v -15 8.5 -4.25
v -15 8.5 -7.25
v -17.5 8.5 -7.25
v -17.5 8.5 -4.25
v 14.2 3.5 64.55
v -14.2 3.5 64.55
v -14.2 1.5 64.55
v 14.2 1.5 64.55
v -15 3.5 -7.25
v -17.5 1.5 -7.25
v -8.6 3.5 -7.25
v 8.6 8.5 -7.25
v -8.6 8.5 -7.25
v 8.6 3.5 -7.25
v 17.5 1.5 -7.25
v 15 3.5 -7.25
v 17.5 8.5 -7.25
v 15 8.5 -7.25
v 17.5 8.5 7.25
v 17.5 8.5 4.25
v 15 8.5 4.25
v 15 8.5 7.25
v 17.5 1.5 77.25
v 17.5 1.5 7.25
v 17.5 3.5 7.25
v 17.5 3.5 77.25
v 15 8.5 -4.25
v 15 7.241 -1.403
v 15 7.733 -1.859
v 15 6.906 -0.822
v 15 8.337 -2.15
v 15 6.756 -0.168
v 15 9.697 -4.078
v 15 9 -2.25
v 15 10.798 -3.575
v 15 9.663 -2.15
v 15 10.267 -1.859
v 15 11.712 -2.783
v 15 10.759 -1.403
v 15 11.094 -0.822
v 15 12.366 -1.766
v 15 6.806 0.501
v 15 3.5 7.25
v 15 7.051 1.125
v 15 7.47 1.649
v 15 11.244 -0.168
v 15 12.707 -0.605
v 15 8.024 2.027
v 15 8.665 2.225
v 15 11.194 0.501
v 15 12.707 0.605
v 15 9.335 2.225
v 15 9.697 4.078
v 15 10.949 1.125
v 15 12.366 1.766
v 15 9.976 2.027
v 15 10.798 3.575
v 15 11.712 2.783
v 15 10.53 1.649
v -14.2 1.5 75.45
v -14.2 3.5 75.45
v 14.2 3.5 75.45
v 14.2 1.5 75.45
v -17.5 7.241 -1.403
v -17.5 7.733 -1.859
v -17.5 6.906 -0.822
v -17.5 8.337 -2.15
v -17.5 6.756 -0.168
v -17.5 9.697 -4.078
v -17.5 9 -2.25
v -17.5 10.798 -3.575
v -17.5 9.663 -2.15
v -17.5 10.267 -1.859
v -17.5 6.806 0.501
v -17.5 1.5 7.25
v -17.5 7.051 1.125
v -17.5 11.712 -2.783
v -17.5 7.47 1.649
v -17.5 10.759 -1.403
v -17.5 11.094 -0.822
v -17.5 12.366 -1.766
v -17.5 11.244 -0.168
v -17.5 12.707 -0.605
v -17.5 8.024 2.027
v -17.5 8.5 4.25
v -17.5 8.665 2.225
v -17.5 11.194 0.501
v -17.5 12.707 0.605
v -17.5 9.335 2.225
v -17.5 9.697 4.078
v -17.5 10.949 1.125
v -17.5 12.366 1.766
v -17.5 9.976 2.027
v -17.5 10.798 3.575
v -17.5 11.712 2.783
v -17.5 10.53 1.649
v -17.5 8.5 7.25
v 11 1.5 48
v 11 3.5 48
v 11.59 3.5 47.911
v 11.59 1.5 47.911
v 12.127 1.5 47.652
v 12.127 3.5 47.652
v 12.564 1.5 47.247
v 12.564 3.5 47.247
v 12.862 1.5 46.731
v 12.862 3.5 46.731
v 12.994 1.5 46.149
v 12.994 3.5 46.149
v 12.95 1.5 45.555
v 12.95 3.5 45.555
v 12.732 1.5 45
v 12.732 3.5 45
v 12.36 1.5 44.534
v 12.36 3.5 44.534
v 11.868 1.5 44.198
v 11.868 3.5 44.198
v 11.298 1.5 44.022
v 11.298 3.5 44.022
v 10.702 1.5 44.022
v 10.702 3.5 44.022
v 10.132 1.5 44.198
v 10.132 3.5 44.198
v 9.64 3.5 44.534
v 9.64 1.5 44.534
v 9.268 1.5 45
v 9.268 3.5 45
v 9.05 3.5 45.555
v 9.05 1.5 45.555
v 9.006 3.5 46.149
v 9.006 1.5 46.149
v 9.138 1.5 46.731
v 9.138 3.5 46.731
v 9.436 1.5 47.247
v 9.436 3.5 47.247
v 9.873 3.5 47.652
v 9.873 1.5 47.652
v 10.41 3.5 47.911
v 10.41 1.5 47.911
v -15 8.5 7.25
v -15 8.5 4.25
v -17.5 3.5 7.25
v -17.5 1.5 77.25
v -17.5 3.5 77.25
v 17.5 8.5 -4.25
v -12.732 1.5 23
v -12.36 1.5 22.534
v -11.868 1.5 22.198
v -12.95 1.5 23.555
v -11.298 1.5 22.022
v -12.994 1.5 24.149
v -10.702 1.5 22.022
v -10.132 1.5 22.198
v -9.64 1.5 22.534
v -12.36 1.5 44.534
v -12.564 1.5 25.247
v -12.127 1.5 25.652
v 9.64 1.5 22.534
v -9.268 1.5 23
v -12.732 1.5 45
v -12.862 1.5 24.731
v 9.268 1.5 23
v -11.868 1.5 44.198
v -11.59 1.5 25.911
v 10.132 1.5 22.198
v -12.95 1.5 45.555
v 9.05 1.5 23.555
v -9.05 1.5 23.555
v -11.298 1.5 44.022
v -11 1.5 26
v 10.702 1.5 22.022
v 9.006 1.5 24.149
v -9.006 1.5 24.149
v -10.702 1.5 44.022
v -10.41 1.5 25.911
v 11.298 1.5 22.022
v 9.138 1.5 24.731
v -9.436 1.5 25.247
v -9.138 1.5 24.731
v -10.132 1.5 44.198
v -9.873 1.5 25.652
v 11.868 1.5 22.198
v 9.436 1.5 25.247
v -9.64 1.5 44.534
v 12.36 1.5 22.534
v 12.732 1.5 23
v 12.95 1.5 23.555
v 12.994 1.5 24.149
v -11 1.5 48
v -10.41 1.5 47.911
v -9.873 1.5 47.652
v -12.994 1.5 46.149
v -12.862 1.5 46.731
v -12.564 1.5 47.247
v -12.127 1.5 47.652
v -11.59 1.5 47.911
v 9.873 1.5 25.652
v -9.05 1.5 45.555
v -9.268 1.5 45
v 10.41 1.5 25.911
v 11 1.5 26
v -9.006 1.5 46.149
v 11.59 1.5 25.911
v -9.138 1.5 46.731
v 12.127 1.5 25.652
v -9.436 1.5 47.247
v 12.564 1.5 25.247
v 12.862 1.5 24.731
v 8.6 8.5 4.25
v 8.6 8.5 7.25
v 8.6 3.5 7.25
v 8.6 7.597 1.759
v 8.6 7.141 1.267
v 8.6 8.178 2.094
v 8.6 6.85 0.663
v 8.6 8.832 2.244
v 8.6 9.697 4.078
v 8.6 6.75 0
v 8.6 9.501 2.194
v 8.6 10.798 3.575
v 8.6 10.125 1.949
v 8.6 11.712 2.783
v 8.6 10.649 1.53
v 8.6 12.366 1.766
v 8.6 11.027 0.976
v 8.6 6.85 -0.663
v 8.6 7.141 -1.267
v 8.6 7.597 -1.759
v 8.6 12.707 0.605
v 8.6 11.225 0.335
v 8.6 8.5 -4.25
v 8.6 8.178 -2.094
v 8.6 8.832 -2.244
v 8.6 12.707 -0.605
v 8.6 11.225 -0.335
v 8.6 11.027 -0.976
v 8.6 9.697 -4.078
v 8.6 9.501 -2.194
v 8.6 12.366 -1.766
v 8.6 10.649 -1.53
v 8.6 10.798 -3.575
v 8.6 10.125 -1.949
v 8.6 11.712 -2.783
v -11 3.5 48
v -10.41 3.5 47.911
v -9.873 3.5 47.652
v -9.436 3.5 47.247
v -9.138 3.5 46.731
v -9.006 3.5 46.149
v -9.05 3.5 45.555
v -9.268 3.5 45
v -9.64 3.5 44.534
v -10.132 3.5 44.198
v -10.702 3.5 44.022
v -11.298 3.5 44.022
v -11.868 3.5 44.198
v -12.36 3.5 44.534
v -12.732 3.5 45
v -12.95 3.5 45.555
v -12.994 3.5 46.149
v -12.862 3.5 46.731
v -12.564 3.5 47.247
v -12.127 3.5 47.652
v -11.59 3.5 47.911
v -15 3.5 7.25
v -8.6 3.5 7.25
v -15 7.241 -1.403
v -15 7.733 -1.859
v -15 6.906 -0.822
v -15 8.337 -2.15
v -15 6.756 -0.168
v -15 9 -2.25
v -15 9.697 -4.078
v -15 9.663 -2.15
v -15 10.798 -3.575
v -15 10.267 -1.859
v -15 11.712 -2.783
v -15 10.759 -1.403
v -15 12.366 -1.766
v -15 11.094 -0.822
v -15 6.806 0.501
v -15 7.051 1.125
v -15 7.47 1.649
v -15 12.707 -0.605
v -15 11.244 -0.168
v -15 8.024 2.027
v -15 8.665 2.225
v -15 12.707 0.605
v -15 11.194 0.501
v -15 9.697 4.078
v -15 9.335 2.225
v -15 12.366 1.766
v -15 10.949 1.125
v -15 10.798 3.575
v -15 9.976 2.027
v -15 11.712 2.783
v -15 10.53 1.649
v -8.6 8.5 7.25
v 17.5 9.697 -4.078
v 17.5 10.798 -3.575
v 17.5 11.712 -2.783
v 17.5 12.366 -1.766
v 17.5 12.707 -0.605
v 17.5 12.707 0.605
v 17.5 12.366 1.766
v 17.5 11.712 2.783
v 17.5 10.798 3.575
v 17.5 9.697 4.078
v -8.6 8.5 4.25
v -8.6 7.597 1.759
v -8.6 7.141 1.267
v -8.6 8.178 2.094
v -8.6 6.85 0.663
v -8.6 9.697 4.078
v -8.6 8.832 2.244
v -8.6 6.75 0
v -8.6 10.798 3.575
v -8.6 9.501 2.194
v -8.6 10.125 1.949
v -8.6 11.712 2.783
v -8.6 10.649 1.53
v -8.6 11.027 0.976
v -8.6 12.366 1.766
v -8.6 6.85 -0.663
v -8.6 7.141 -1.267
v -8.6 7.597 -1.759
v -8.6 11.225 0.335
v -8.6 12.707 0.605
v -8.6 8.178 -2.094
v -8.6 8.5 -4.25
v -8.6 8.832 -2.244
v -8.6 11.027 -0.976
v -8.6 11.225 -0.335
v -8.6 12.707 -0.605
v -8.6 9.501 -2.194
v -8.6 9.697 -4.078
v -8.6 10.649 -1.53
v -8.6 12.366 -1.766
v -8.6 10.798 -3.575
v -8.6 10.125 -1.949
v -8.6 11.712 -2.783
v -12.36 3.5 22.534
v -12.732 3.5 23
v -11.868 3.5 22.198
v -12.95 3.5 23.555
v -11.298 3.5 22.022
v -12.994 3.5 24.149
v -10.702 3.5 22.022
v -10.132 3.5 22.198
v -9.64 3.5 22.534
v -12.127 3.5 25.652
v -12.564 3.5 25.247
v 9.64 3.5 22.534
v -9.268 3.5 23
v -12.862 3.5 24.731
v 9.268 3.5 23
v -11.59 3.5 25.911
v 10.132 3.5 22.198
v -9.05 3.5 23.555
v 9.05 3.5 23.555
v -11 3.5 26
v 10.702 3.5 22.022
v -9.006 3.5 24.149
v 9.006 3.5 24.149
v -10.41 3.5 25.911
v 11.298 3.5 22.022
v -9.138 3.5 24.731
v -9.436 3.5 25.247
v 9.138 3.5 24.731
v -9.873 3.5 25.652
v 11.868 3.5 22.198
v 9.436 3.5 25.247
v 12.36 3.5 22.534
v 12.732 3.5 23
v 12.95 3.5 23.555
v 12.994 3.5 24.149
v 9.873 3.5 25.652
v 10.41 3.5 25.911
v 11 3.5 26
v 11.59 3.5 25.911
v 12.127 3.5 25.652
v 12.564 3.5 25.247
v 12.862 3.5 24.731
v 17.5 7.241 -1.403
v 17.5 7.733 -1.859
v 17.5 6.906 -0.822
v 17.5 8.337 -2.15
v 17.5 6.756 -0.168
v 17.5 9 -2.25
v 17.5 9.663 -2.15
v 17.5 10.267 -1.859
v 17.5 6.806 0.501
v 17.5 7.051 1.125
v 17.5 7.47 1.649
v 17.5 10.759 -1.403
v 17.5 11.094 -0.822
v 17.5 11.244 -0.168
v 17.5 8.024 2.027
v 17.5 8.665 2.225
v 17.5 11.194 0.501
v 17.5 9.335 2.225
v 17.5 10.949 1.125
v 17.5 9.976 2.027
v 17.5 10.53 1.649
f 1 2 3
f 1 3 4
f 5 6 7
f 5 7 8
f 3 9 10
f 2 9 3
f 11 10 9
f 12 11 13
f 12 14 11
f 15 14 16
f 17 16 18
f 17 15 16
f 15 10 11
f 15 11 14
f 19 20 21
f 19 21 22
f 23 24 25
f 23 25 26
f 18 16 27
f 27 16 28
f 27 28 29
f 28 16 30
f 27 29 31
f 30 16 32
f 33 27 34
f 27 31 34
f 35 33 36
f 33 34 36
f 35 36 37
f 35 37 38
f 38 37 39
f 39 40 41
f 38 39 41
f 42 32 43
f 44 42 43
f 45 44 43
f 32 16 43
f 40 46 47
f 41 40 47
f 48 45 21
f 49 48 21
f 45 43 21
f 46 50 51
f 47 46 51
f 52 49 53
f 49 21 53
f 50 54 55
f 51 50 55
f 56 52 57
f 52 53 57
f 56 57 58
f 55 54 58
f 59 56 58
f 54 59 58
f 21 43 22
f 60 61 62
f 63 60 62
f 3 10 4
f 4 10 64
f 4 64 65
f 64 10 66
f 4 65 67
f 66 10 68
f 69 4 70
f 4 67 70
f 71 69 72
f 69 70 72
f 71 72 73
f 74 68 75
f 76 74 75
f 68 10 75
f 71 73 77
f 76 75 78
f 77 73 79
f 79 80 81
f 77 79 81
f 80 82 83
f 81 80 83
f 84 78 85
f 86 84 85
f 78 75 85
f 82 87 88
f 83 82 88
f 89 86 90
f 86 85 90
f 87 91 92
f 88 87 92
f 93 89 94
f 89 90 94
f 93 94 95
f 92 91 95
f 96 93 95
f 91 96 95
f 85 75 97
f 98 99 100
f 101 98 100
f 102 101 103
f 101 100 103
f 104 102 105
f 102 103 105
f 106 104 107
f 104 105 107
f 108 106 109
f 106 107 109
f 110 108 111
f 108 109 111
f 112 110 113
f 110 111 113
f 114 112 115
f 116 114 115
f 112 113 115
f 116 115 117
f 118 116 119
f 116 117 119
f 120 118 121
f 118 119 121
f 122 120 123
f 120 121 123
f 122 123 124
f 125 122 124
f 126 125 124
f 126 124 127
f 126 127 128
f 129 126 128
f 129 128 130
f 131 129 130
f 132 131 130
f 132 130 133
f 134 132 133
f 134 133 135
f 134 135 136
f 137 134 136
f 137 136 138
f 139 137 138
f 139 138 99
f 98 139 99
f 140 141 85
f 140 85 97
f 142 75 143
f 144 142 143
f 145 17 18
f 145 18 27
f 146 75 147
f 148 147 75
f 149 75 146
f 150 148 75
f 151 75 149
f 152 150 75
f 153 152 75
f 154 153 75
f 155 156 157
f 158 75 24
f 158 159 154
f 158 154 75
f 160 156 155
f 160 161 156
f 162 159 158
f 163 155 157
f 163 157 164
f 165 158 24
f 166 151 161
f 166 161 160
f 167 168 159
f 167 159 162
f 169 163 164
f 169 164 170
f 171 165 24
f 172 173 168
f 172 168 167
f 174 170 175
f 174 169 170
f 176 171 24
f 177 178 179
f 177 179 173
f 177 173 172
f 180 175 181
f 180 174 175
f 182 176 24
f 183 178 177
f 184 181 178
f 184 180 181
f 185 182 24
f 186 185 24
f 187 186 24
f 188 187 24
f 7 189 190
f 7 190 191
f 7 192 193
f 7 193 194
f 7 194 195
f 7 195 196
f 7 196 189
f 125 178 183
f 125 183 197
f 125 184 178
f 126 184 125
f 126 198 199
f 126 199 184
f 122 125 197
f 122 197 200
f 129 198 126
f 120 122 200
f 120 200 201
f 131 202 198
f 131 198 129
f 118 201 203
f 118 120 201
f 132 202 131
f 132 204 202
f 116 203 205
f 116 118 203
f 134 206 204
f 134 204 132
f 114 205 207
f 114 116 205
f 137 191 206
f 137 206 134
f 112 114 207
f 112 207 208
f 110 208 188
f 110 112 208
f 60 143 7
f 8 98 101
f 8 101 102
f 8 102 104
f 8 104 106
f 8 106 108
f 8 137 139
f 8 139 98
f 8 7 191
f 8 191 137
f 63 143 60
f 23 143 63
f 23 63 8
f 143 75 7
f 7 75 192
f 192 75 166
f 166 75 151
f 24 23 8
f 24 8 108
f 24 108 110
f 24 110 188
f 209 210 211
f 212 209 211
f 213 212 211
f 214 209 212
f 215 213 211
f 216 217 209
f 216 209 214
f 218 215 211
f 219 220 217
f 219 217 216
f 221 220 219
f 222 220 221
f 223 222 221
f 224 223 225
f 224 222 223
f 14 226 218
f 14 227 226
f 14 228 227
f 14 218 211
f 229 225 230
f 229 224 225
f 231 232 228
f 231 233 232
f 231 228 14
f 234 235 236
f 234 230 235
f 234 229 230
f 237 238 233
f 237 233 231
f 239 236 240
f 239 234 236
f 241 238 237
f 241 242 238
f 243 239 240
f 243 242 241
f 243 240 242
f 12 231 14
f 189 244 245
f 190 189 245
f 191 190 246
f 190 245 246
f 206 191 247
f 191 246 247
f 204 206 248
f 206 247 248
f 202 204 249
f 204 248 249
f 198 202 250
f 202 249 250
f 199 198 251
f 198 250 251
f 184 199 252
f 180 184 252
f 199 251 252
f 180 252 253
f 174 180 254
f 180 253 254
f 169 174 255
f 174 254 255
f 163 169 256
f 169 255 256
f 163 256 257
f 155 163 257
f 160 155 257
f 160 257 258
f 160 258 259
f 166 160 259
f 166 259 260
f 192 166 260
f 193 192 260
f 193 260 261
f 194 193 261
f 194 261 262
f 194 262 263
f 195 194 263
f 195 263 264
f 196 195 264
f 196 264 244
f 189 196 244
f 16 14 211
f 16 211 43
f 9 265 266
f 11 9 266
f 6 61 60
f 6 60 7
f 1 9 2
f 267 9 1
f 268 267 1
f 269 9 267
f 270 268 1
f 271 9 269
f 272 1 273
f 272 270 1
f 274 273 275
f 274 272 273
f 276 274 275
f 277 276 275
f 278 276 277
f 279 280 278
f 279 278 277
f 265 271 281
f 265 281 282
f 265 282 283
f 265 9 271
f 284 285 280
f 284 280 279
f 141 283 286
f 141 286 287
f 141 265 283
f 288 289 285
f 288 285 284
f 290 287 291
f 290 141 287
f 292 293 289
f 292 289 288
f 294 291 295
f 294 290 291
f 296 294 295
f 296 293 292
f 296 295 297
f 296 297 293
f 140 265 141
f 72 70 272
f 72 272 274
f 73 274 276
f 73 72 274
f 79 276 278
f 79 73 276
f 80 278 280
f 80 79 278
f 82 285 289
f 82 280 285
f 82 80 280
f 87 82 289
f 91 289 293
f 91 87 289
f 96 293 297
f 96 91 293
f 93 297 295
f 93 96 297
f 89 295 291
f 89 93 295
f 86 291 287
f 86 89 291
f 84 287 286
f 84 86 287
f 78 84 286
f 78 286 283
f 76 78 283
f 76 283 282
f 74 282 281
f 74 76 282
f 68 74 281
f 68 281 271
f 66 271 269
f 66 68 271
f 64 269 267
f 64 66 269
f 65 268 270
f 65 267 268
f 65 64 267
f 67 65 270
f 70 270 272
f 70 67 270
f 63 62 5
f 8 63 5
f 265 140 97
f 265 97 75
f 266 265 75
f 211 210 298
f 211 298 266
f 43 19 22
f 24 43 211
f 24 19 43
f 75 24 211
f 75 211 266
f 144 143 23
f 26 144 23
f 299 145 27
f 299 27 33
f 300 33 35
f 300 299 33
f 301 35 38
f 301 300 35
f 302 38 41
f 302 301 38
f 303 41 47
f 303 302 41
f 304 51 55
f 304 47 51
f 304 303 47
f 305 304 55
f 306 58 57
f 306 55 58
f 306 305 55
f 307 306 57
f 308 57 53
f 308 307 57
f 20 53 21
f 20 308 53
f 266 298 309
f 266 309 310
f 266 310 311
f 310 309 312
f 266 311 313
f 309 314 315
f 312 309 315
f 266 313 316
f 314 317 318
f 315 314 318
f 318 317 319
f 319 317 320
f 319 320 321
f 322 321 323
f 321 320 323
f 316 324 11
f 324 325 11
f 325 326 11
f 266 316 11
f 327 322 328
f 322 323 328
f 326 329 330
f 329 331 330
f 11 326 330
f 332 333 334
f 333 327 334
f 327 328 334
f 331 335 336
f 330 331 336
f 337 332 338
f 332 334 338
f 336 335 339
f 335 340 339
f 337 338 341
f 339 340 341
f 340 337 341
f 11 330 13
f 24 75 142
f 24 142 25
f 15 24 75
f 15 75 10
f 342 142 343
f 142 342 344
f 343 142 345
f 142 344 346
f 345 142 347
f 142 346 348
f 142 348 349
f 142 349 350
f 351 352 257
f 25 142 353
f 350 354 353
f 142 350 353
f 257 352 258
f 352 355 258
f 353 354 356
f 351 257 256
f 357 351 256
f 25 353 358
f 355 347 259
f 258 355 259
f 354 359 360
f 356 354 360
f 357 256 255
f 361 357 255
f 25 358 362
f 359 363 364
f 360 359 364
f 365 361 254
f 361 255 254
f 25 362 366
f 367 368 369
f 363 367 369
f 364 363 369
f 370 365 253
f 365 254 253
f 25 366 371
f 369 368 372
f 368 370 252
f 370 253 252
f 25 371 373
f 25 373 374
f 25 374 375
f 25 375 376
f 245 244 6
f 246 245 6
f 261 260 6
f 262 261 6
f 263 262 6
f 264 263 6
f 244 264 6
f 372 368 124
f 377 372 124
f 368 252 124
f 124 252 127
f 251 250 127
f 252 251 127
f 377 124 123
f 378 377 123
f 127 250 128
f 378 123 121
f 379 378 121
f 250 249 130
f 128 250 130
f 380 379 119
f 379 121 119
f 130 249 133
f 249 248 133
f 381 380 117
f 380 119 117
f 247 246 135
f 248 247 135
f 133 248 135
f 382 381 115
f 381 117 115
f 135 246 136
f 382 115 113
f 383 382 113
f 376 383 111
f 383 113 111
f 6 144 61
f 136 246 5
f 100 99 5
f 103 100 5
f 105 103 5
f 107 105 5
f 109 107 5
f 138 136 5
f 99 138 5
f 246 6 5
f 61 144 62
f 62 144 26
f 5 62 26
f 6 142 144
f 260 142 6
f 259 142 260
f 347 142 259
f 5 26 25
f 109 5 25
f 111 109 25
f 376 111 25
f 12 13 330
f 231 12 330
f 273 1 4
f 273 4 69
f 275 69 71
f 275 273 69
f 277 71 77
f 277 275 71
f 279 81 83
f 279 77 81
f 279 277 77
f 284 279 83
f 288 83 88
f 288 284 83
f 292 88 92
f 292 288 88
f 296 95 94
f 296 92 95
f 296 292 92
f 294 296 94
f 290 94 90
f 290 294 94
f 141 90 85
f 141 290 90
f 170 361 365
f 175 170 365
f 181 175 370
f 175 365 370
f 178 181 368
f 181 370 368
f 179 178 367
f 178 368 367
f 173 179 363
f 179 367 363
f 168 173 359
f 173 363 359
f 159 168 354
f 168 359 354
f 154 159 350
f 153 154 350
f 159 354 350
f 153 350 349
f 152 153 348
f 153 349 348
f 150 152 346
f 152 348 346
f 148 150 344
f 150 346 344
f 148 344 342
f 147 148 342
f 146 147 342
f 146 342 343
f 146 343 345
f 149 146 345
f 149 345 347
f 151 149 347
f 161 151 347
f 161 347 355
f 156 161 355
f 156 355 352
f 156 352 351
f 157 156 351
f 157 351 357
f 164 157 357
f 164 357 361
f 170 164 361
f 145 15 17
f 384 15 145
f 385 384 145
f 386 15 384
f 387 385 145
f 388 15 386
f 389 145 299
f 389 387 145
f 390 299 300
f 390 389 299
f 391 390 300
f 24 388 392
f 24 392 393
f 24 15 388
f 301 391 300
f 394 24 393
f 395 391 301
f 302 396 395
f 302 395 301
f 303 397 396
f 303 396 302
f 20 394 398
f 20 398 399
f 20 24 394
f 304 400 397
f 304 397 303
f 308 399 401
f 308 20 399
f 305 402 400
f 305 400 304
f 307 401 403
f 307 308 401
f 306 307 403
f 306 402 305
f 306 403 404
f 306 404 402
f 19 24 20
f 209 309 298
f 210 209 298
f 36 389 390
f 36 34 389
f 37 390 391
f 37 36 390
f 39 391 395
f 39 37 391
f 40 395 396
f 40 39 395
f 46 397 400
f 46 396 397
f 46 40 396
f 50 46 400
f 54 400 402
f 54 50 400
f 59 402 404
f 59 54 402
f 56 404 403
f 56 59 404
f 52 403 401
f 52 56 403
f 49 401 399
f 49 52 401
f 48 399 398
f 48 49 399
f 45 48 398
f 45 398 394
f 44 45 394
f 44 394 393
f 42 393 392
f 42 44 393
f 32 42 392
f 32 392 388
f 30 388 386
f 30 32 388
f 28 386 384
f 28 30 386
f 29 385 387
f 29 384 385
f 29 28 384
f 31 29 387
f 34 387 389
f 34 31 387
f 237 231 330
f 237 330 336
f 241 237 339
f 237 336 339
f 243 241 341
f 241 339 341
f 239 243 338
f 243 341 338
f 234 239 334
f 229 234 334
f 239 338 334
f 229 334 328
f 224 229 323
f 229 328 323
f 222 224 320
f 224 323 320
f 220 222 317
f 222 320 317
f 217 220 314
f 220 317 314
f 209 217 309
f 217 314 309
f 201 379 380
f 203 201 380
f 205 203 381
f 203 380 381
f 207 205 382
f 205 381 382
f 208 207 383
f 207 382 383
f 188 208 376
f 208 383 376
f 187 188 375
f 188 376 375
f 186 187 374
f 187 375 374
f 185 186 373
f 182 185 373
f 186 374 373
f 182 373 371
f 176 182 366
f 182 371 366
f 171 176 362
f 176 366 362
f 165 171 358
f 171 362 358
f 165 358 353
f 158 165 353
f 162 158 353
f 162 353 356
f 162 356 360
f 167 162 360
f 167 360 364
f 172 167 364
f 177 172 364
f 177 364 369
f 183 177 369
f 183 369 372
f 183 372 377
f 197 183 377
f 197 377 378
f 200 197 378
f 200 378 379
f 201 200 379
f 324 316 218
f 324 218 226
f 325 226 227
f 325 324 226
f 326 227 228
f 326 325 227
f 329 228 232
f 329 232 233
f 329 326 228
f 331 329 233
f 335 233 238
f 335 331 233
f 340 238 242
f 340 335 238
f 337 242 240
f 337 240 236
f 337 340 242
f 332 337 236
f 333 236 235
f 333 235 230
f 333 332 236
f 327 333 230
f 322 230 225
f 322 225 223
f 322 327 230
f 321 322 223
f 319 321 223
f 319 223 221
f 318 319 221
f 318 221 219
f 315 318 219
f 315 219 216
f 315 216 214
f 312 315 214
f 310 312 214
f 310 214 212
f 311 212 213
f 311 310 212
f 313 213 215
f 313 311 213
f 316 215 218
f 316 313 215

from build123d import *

# Parameters (mm, degrees)
SKETCH1_R                = 2.25
BOSS_EXTRUDE1_DEPTH      = 20
SKETCH2_W                = 30
SKETCH2_H                = 9.25
CUT_EXTRUDE1_DEPTH       = 28.799505391
SKETCH3_W                = 2.5
SKETCH3_H                = 14.25
CUT_EXTRUDE2_DEPTH       = 28.799505391
BOSS_EXTRUDE2_DEPTH      = 8.6
BOSS_EXTRUDE2_DEPTH_BACK = 8.6
SKETCH5_R                = 2.25
SKETCH6_W                = 4.5
SKETCH6_H                = 3
CUT_EXTRUDE4_DEPTH       = 38.948978906
SKETCH9_W                = 35
SKETCH9_H                = 70
BOSS_EXTRUDE4_DEPTH      = 2
SKETCH10_W               = 28.4
SKETCH10_H               = 10.9
CUT_EXTRUDE5_DEPTH       = 80.745689539
SKETCH13_R               = 2
CUT_EXTRUDE6_DEPTH       = 80.745689539


with BuildPart() as part:
    # Sketch1 → Boss-Extrude1 (new, symmetric)
    with BuildSketch(Plane(origin=(0, 0, 0), x_dir=(0, 0, -1), z_dir=(1, 0, 0))):
        with BuildLine():
            Line((2.25, 1.5), (7.25, 1.5))
            Line((7.25, 1.5), (7.25, 8.5))
            Line((7.25, 8.5), (4.25, 8.5))
            ThreePointArc((4.25, 8.5), (0, 12.75), (-4.25, 8.5))
            Line((-4.25, 8.5), (-7.25, 8.5))
            Line((-7.25, 8.5), (-7.25, 1.5))
            Line((-7.25, 1.5), (-2.25, 1.5))
            Line((-2.25, 1.5), (-2.25, -1.5))
            Line((-2.25, -1.5), (2.25, -1.5))
            Line((2.25, -1.5), (2.25, 1.5))
        make_face()
        with Locations((0, 9)):
            Circle(SKETCH1_R, mode=Mode.SUBTRACT)
    extrude(amount=BOSS_EXTRUDE1_DEPTH, both=True)

    # Sketch2 → Cut-Extrude1 (cut, through all)
    with BuildSketch(Plane.XY.offset(7.25)):
        with Locations((0, 8.125)):
            Rectangle(SKETCH2_W, SKETCH2_H)
    extrude(amount=-CUT_EXTRUDE1_DEPTH, mode=Mode.SUBTRACT)

    # Sketch3 → Cut-Extrude2 (cut, through all)
    with BuildSketch(Plane.XY.offset(7.25)):
        with Locations((-18.75, 5.625)):
            Rectangle(SKETCH3_W, SKETCH3_H)
        with Locations((18.75, 5.625)):
            Rectangle(SKETCH3_W, SKETCH3_H)
    extrude(amount=-CUT_EXTRUDE2_DEPTH, mode=Mode.SUBTRACT)

    # Sketch5 → Boss-Extrude2 (add, two sides: drawn at the far end of the back side and taken through both)
    with BuildSketch(Plane(origin=(0, 0, 0), x_dir=(0, 0, -1), z_dir=(1, 0, 0)).offset(-BOSS_EXTRUDE2_DEPTH_BACK)):
        with BuildLine():
            Line((-4.25, 8.5), (-7.25, 8.5))
            Line((-7.25, 8.5), (-7.25, 3.5))
            Line((-7.25, 3.5), (7.25, 3.5))
            Line((7.25, 3.5), (7.25, 8.5))
            Line((7.25, 8.5), (4.25, 8.5))
            ThreePointArc((4.25, 8.5), (0, 12.75), (-4.25, 8.5))
        make_face()
        with Locations(Location((0, 9, 0), (0, 0, 270))):
            Circle(SKETCH5_R, mode=Mode.SUBTRACT)
    extrude(amount=BOSS_EXTRUDE2_DEPTH + BOSS_EXTRUDE2_DEPTH_BACK)

    # Sketch6 → Cut-Extrude4 (cut, through all)
    with BuildSketch(Plane.ZY.offset(17.5)):
        Rectangle(SKETCH6_W, SKETCH6_H)
    extrude(amount=-CUT_EXTRUDE4_DEPTH, mode=Mode.SUBTRACT)


with BuildPart() as body_2:
    # Sketch9 → Boss-Extrude4 (new body)
    with BuildSketch(Plane.XZ.offset(-1.5)):
        with Locations((0, 42.25)):
            Rectangle(SKETCH9_W, SKETCH9_H)
    extrude(amount=-BOSS_EXTRUDE4_DEPTH)

    # Sketch10 → Cut-Extrude5 (cut, through all)
    with BuildSketch(Plane(origin=(0, 3.5, 0), x_dir=(1, 0, 0), z_dir=(0, 1, 0))):
        with Locations((0, -70)):
            Rectangle(SKETCH10_W, SKETCH10_H)
    extrude(amount=-CUT_EXTRUDE5_DEPTH, mode=Mode.SUBTRACT)

    # Sketch13 → Cut-Extrude6 (cut, through all)
    with BuildSketch(Plane(origin=(0, 3.5, 0), x_dir=(1, 0, 0), z_dir=(0, 1, 0))):
        with Locations(Location((-11, -46, 0), (0, 0, 270))):
            Circle(SKETCH13_R)
        with Locations(Location((11, -46, 0), (0, 0, 270))):
            Circle(SKETCH13_R)
        with Locations(Location((11, -24, 0), (0, 0, 270))):
            Circle(SKETCH13_R)
        with Locations(Location((-11, -24, 0), (0, 0, 270))):
            Circle(SKETCH13_R)
    extrude(amount=-CUT_EXTRUDE6_DEPTH, mode=Mode.SUBTRACT)


solid = Compound([part.part, body_2.part])
